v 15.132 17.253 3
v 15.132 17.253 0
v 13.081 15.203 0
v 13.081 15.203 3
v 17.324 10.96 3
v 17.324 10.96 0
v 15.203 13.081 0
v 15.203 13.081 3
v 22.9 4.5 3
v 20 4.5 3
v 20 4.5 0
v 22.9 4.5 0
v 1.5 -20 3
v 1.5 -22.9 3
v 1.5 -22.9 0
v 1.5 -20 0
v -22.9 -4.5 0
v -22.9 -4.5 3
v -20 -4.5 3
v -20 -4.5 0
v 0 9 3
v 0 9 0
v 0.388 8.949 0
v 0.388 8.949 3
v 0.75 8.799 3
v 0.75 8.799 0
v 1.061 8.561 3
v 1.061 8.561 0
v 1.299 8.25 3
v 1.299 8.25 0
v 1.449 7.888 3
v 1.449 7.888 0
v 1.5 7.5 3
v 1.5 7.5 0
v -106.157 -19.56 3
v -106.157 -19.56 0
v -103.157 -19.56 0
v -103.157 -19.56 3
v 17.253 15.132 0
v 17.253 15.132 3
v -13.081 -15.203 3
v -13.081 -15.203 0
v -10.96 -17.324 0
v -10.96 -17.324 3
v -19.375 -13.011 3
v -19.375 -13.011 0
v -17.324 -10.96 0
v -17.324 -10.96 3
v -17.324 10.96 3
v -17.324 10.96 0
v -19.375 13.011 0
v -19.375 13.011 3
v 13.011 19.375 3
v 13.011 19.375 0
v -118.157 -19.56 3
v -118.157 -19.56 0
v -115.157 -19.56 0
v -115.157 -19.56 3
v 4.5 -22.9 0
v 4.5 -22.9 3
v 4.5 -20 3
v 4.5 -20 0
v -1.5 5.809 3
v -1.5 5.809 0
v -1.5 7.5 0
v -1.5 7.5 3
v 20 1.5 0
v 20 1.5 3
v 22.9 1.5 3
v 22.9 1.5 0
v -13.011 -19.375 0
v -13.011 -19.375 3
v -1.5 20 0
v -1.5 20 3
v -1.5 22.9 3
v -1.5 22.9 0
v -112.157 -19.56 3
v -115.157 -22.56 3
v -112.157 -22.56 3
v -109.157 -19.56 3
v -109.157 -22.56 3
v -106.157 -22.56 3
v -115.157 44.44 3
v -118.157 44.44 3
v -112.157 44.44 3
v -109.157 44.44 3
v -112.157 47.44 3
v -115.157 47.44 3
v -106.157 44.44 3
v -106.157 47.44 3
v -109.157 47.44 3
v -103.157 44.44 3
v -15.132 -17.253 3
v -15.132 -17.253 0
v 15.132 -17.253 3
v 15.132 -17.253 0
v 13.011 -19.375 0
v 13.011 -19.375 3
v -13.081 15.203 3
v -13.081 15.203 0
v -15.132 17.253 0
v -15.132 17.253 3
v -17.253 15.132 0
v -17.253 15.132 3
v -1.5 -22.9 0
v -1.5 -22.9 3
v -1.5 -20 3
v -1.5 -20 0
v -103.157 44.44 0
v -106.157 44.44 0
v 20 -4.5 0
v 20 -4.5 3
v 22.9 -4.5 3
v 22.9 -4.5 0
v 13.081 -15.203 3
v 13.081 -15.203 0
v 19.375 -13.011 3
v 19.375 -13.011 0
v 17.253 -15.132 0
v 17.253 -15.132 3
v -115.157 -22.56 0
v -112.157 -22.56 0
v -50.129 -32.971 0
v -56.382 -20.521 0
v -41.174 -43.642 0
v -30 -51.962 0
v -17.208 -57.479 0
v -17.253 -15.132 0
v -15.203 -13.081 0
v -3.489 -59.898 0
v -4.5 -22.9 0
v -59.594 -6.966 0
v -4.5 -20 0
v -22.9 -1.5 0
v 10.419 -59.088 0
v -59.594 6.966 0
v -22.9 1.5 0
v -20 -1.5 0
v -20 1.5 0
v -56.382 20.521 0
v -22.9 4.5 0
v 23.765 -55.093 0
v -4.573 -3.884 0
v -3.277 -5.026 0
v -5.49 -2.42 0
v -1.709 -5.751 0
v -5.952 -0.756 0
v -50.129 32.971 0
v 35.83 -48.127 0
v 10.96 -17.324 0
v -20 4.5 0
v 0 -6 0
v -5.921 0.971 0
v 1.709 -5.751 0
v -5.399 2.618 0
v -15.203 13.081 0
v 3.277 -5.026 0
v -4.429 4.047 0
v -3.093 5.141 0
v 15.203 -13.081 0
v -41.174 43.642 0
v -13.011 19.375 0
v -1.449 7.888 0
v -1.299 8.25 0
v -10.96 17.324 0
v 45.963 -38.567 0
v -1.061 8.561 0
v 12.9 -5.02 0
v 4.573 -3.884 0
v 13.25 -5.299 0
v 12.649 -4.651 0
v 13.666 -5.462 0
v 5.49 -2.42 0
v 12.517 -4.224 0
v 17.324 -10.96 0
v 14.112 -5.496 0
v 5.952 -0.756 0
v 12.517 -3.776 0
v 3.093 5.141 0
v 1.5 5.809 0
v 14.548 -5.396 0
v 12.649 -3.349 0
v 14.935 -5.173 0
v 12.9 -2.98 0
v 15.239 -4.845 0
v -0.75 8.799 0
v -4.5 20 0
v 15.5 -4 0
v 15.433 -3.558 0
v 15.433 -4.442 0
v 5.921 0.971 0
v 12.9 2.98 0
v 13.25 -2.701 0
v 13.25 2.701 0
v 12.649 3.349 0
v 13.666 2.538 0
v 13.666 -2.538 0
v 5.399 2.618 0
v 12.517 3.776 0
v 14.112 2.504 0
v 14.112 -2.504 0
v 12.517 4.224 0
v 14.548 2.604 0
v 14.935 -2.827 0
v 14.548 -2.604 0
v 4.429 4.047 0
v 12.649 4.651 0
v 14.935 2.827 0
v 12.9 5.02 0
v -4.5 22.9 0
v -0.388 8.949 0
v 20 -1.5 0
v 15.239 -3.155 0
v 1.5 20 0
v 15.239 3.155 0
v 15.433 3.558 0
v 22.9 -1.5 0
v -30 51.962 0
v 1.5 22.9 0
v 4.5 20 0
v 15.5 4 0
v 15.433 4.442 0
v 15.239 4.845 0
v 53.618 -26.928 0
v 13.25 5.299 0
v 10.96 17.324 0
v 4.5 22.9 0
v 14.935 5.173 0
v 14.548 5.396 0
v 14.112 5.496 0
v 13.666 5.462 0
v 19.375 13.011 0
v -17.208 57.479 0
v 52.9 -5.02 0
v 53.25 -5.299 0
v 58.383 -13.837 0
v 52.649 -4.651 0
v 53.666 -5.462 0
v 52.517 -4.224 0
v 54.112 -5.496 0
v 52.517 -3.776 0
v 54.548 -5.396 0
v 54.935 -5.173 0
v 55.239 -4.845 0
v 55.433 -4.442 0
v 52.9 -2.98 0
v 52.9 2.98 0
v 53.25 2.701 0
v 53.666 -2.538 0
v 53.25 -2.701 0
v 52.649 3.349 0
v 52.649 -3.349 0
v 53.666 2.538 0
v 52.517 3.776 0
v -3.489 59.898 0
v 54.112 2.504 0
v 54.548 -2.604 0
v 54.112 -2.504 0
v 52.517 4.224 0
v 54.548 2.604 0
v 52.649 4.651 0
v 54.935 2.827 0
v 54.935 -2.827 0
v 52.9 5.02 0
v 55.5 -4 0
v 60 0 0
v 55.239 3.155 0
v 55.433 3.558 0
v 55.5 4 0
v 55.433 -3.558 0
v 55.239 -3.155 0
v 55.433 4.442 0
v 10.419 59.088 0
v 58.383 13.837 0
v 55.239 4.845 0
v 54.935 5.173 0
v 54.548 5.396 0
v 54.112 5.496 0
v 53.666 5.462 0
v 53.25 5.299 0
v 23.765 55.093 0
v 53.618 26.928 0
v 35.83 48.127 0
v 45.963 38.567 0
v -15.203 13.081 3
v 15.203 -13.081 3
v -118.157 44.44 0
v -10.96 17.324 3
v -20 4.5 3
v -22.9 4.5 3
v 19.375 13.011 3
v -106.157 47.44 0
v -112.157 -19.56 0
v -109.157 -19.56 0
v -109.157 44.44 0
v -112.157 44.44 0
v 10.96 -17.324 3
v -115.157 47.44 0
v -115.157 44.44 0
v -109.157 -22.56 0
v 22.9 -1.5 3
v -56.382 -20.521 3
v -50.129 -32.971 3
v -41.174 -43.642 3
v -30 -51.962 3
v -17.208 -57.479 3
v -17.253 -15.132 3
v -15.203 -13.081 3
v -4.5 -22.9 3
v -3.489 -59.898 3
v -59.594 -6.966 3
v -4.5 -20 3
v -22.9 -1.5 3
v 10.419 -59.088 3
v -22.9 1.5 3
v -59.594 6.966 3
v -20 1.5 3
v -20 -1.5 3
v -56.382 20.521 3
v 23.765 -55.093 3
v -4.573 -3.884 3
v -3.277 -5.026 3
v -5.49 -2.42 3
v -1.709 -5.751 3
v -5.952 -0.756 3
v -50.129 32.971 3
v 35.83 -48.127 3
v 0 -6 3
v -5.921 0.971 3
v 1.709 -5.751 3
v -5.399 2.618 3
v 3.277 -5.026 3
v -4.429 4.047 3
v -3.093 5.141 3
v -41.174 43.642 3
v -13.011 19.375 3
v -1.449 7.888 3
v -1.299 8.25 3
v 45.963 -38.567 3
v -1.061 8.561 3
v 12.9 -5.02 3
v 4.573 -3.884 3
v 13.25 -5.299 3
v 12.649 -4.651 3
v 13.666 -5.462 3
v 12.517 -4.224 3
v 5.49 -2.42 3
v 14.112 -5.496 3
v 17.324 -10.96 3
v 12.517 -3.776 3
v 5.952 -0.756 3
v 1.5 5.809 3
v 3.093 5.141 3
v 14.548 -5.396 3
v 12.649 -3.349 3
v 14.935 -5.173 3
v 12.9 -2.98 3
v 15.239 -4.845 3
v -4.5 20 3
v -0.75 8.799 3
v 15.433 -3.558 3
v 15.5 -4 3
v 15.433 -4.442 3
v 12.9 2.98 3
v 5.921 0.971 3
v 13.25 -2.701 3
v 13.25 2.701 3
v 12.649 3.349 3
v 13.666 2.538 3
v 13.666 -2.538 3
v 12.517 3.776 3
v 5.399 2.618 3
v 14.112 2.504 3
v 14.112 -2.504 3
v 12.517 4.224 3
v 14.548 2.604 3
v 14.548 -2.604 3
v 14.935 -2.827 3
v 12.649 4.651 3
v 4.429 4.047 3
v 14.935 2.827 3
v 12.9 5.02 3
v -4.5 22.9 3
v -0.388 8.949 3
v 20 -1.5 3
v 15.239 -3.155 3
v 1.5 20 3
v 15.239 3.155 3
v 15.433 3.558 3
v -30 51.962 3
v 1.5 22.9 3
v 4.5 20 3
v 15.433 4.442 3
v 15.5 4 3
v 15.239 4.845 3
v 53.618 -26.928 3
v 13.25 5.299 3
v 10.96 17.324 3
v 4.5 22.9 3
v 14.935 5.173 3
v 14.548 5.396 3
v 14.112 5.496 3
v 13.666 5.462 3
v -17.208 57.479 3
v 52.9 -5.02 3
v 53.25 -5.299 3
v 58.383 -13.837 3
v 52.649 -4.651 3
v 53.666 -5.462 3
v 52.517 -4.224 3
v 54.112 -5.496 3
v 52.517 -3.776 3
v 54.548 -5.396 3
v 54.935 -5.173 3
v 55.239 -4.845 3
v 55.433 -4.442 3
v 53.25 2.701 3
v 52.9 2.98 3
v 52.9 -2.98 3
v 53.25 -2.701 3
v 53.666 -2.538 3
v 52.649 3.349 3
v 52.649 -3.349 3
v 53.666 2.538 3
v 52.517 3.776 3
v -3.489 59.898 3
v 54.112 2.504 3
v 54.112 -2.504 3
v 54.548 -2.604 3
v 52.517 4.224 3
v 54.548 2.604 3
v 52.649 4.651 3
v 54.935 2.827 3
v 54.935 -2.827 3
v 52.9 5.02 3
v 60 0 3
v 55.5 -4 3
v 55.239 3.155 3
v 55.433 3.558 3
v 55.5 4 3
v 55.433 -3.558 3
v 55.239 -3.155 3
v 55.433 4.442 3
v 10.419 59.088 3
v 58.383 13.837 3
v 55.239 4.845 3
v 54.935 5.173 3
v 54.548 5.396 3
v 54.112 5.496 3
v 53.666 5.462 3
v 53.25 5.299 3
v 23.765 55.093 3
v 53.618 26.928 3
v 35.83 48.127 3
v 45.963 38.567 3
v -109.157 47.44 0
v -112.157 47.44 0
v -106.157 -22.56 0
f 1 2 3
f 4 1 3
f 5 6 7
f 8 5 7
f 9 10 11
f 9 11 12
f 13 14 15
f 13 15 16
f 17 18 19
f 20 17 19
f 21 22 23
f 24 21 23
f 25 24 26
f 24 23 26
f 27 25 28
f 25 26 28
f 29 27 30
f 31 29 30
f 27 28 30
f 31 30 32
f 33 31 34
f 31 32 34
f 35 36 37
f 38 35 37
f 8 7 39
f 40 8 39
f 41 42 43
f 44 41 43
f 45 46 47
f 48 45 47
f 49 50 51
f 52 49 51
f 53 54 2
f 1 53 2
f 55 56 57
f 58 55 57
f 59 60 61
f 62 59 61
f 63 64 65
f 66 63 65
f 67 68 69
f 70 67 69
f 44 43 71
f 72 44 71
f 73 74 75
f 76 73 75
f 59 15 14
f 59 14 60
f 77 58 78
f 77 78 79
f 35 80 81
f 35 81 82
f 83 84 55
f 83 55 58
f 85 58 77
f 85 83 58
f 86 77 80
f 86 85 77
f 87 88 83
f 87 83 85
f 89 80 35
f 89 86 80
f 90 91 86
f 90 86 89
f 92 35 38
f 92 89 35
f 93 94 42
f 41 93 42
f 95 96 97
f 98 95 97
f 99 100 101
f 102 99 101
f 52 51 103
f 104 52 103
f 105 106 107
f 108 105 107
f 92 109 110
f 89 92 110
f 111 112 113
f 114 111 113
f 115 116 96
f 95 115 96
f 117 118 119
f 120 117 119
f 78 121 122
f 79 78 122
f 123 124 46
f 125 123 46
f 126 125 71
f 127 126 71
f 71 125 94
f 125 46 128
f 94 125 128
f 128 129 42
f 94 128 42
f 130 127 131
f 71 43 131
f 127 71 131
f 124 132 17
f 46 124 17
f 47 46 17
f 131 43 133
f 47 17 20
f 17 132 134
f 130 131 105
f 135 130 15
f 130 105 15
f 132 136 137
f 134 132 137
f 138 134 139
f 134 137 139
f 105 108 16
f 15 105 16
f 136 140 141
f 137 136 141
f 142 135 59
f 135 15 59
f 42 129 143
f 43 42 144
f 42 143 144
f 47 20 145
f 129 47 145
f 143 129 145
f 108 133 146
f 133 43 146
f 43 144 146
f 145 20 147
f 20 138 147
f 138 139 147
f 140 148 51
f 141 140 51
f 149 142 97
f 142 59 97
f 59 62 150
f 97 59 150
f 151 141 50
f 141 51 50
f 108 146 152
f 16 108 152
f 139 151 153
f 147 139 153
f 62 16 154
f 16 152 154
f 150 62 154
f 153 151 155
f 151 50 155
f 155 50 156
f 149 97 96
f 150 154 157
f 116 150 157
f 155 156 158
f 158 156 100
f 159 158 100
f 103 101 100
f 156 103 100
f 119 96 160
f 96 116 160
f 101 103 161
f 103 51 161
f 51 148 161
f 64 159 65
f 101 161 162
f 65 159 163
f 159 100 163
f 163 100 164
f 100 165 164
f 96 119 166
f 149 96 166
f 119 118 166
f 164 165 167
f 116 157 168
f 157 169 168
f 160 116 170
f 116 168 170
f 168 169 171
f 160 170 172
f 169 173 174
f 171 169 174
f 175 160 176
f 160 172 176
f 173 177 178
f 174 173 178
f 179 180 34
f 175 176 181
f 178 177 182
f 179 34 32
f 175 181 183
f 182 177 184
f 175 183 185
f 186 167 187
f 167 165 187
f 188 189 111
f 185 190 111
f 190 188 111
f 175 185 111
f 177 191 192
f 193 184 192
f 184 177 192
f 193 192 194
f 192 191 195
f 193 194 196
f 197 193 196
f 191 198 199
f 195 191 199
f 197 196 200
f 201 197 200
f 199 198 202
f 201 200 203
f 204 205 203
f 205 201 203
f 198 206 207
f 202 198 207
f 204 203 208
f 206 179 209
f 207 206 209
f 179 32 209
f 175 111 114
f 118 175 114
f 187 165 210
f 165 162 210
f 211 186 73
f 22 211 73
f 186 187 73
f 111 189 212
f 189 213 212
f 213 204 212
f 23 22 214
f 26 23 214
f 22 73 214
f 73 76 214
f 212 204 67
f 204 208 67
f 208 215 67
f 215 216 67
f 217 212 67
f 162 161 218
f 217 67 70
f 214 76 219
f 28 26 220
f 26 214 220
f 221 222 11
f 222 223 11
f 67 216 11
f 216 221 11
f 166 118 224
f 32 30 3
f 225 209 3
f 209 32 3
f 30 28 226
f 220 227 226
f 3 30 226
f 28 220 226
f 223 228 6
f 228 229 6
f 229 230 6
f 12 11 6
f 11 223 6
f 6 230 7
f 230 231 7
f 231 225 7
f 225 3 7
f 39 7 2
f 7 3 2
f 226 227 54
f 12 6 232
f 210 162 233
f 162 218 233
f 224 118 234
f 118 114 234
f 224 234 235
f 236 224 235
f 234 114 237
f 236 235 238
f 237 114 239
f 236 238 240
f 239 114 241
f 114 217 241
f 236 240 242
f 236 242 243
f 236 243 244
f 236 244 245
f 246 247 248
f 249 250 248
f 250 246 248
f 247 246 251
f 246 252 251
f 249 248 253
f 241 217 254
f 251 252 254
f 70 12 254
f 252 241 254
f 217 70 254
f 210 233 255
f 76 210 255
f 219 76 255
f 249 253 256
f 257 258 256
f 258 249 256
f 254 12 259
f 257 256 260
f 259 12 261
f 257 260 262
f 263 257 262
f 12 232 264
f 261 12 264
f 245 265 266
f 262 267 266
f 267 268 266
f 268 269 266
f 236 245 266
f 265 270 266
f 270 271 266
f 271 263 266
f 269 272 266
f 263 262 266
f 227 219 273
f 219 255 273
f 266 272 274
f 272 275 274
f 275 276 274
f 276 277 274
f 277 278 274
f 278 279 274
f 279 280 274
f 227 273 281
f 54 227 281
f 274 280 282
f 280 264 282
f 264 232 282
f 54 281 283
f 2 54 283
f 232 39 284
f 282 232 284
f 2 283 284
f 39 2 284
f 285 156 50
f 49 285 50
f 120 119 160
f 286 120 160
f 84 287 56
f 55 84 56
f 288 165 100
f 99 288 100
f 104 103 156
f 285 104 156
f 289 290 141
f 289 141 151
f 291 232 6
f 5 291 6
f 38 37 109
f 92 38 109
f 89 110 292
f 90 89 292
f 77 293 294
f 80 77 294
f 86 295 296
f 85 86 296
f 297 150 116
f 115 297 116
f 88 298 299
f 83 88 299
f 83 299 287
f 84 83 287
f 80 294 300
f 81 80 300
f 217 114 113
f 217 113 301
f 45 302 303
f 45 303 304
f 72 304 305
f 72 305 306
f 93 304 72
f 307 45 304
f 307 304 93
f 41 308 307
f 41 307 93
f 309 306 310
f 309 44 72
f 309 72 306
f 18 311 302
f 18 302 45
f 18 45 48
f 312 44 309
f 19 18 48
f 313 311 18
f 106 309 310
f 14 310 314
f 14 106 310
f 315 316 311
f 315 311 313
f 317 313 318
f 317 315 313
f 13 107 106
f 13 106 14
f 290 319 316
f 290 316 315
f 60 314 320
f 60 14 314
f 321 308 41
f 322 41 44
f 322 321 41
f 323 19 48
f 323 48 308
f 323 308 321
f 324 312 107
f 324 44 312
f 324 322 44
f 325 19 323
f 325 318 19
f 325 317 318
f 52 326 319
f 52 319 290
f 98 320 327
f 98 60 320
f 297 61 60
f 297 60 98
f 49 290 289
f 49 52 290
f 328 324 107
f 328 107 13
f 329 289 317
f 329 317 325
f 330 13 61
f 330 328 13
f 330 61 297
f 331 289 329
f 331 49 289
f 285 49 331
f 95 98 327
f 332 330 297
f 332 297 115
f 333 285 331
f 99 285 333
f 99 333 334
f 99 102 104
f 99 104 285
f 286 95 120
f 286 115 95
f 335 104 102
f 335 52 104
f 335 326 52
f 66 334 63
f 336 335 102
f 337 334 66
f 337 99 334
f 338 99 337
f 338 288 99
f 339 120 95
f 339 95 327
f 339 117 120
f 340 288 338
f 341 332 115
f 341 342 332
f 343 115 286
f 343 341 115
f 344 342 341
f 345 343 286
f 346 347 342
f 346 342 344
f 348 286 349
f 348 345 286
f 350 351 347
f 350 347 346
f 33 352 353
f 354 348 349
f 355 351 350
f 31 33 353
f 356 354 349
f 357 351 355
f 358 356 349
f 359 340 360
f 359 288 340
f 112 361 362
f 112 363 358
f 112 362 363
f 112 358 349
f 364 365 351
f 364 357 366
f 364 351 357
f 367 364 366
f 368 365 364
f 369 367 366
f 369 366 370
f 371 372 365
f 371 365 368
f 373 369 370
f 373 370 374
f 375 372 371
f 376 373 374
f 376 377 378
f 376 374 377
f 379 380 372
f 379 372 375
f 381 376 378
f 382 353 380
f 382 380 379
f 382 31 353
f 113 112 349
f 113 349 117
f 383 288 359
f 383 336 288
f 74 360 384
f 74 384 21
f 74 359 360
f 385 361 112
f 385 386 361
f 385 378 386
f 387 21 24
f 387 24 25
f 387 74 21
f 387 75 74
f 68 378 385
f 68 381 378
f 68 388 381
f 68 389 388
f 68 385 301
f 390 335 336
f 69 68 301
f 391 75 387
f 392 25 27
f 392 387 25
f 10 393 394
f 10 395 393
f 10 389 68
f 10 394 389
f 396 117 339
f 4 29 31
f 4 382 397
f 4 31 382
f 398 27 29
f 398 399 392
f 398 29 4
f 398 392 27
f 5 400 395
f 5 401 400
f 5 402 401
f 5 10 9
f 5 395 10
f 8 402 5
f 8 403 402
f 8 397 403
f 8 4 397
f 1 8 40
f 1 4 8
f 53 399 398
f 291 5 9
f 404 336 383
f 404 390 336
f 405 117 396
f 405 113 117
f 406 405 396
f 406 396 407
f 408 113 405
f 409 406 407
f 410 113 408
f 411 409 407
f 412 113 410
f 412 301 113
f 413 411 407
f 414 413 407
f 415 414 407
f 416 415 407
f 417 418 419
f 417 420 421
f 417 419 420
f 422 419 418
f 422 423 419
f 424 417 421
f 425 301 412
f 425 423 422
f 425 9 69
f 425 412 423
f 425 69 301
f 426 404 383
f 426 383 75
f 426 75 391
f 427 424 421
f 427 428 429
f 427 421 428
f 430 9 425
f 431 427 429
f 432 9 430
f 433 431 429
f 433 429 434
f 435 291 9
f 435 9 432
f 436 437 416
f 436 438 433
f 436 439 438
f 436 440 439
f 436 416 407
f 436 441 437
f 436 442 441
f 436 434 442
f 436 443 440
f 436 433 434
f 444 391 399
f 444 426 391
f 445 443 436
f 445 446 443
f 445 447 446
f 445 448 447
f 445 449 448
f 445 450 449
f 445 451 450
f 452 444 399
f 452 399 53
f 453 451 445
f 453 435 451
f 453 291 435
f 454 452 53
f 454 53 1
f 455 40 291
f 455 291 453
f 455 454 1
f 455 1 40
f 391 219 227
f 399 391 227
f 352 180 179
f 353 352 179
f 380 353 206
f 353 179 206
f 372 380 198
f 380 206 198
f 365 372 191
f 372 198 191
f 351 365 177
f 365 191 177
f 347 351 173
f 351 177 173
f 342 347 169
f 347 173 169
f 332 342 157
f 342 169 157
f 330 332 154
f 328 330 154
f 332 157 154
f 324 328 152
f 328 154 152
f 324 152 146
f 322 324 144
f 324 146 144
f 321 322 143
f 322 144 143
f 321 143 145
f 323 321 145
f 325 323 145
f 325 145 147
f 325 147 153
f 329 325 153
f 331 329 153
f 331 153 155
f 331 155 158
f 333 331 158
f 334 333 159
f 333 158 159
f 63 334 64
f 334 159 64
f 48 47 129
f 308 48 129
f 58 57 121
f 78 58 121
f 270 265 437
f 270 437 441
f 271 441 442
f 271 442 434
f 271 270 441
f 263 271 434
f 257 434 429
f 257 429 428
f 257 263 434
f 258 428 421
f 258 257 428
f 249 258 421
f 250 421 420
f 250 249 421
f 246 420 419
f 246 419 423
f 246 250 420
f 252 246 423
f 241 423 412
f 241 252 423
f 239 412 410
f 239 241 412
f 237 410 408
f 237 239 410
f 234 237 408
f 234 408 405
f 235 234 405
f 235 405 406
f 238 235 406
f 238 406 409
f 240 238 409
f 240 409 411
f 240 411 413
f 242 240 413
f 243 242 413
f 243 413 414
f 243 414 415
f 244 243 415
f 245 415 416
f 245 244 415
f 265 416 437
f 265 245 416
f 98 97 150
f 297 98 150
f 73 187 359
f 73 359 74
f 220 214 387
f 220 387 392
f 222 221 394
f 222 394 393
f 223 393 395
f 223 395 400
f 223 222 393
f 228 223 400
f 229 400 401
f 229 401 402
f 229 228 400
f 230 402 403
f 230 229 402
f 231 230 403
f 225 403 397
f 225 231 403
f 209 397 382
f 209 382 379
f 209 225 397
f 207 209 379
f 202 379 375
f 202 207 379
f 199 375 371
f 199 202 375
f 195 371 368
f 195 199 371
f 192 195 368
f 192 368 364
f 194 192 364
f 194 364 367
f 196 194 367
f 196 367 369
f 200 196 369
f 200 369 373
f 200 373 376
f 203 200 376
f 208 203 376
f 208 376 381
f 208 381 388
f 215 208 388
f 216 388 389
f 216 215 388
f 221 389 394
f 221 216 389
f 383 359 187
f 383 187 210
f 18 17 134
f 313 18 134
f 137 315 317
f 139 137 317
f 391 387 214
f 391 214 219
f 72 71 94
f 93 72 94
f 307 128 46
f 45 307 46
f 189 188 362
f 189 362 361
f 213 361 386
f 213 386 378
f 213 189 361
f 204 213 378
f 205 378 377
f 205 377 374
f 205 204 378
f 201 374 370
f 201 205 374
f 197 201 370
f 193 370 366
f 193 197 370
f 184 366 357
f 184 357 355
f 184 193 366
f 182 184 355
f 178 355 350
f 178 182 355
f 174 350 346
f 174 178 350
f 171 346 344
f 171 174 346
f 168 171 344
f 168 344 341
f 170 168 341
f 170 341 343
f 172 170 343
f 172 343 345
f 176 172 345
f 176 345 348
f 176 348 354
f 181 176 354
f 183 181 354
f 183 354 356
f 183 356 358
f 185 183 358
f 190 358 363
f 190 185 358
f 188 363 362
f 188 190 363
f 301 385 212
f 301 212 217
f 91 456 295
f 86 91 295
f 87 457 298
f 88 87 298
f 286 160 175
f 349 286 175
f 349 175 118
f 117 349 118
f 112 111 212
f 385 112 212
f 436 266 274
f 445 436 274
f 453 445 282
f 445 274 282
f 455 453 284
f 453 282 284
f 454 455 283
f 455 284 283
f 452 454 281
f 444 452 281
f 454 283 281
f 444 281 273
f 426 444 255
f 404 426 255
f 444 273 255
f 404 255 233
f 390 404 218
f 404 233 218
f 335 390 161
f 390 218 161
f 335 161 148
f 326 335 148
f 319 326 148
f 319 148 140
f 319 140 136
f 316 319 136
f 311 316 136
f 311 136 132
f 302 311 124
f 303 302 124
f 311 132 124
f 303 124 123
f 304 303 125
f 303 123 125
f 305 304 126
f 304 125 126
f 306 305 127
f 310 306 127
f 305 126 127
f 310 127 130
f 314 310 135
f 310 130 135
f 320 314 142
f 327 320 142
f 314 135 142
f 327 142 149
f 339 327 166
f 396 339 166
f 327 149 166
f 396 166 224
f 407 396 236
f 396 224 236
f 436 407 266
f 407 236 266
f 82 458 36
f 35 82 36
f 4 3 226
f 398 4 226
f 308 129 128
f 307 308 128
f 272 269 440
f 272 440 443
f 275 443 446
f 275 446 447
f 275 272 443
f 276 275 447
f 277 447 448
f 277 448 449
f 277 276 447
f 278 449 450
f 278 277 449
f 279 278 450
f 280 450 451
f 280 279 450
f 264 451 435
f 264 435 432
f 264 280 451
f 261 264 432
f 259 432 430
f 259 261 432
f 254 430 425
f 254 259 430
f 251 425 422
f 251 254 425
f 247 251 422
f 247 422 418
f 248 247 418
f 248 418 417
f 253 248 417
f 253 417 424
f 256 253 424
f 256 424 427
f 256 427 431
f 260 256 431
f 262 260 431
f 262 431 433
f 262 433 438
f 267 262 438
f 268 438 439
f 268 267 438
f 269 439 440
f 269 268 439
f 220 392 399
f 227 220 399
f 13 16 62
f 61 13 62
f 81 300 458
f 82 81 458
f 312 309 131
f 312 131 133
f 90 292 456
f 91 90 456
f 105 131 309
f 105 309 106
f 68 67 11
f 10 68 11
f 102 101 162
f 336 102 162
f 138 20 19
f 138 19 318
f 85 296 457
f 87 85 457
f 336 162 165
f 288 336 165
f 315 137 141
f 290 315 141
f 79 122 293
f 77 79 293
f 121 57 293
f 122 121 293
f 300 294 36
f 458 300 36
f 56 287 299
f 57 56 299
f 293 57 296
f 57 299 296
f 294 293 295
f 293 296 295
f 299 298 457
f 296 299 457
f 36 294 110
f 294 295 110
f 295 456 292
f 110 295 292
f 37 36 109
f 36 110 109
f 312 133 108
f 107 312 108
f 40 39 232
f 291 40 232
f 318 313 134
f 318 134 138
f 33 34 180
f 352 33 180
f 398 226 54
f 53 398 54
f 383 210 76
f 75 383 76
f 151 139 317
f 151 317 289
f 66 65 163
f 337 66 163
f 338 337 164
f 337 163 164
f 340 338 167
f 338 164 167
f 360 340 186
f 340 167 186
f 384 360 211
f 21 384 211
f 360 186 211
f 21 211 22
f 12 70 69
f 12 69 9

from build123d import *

# Parameters (mm, degrees)
F2_DEPTH = 3
F0_R     = 60
F0_W     = 3
F0_H     = 2.9
F0_W_2   = 2.9
F0_H_2   = 3
F0_R_2   = 1.5
F0_R_3   = 20
F3_DEPTH = 3


with BuildPart() as f2:
    # F1 (on Top) → F2 (new body)
    with BuildSketch(Plane.XY):
        Polygon((-112.157464, 47.439776), (-115.157464, 47.439776), (-115.157464, 44.439776), (-118.157464, 44.439776), (-118.157464, -19.560224), (-115.157464, -19.560224), (-115.157464, -22.560224), (-112.157464, -22.560224), (-112.157464, -19.560224), (-109.157464, -19.560224), (-109.157464, -22.560224), (-106.157464, -22.560224), (-106.157464, -19.560224), (-103.157464, -19.560224), (-103.157464, 44.439776), (-106.157464, 44.439776), (-106.157464, 47.439776), (-109.157464, 47.439776), (-109.157464, 44.439776), (-112.157464, 44.439776), align=None)
    extrude(amount=F2_DEPTH)


with BuildPart() as f3:
    # F0 (on Top) → F3 (new body)
    with BuildSketch(Plane.XY):
        Circle(F0_R)
        Polygon((-13.010765, -19.374726), (-15.132085, -17.253405), (-13.081475, -15.202796), (-10.960155, -17.324116), align=None, mode=Mode.SUBTRACT)
        with Locations((-3, -21.45)):
            Rectangle(F0_W, F0_H, mode=Mode.SUBTRACT)
        with Locations((3, -21.45)):
            Rectangle(F0_W, F0_H, mode=Mode.SUBTRACT)
        Polygon((10.960155, -17.324116), (13.081475, -15.202796), (15.132085, -17.253405), (13.010765, -19.374726), align=None, mode=Mode.SUBTRACT)
        Polygon((-17.253405, -15.132085), (-19.374726, -13.010765), (-17.324116, -10.960155), (-15.202796, -13.081475), align=None, mode=Mode.SUBTRACT)
        with Locations((-21.45, -3)):
            Rectangle(F0_W_2, F0_H_2, mode=Mode.SUBTRACT)
        Polygon((15.202796, -13.081475), (17.324116, -10.960155), (19.374726, -13.010765), (17.253405, -15.132085), align=None, mode=Mode.SUBTRACT)
        with Locations((21.45, -3)):
            Rectangle(F0_W_2, F0_H_2, mode=Mode.SUBTRACT)
        with Locations((54, -4)):
            Circle(F0_R_2, mode=Mode.SUBTRACT)
        with Locations((-21.45, 3)):
            Rectangle(F0_W_2, F0_H_2, mode=Mode.SUBTRACT)
        Circle(F0_R_3, mode=Mode.SUBTRACT)
        Polygon((-19.374726, 13.010765), (-17.253405, 15.132085), (-15.202796, 13.081475), (-17.324116, 10.960155), align=None, mode=Mode.SUBTRACT)
        with Locations((21.45, 3)):
            Rectangle(F0_W_2, F0_H_2, mode=Mode.SUBTRACT)
        with Locations((54, 4)):
            Circle(F0_R_2, mode=Mode.SUBTRACT)
        Polygon((17.324116, 10.960155), (15.202796, 13.081475), (17.253405, 15.132085), (19.374726, 13.010765), align=None, mode=Mode.SUBTRACT)
        Polygon((-15.132085, 17.253405), (-13.010765, 19.374726), (-10.960155, 17.324116), (-13.081475, 15.202796), align=None, mode=Mode.SUBTRACT)
        Polygon((13.081475, 15.202796), (10.960155, 17.324116), (13.010765, 19.374726), (15.132085, 17.253405), align=None, mode=Mode.SUBTRACT)
        with Locations((-3, 21.45)):
            Rectangle(F0_W, F0_H, mode=Mode.SUBTRACT)
        with Locations((3, 21.45)):
            Rectangle(F0_W, F0_H, mode=Mode.SUBTRACT)
        Circle(F0_R_3)
        with Locations((14, -4)):
            Circle(F0_R_2, mode=Mode.SUBTRACT)
        with BuildLine():
            ThreePointArc((1.5, 5.809475), (0, -6), (-1.5, 5.809475))
            Line((-1.5, 5.809475), (-1.5, 7.5))
            ThreePointArc((-1.5, 7.5), (-1.06066, 8.56066), (0, 9))
            ThreePointArc((0, 9), (1.06066, 8.56066), (1.5, 7.5))
            Line((1.5, 7.5), (1.5, 5.809475))
        make_face(mode=Mode.SUBTRACT)
        with Locations((14, 4)):
            Circle(F0_R_2, mode=Mode.SUBTRACT)
    extrude(amount=F3_DEPTH)


solid = Compound([f2.part, f3.part])
